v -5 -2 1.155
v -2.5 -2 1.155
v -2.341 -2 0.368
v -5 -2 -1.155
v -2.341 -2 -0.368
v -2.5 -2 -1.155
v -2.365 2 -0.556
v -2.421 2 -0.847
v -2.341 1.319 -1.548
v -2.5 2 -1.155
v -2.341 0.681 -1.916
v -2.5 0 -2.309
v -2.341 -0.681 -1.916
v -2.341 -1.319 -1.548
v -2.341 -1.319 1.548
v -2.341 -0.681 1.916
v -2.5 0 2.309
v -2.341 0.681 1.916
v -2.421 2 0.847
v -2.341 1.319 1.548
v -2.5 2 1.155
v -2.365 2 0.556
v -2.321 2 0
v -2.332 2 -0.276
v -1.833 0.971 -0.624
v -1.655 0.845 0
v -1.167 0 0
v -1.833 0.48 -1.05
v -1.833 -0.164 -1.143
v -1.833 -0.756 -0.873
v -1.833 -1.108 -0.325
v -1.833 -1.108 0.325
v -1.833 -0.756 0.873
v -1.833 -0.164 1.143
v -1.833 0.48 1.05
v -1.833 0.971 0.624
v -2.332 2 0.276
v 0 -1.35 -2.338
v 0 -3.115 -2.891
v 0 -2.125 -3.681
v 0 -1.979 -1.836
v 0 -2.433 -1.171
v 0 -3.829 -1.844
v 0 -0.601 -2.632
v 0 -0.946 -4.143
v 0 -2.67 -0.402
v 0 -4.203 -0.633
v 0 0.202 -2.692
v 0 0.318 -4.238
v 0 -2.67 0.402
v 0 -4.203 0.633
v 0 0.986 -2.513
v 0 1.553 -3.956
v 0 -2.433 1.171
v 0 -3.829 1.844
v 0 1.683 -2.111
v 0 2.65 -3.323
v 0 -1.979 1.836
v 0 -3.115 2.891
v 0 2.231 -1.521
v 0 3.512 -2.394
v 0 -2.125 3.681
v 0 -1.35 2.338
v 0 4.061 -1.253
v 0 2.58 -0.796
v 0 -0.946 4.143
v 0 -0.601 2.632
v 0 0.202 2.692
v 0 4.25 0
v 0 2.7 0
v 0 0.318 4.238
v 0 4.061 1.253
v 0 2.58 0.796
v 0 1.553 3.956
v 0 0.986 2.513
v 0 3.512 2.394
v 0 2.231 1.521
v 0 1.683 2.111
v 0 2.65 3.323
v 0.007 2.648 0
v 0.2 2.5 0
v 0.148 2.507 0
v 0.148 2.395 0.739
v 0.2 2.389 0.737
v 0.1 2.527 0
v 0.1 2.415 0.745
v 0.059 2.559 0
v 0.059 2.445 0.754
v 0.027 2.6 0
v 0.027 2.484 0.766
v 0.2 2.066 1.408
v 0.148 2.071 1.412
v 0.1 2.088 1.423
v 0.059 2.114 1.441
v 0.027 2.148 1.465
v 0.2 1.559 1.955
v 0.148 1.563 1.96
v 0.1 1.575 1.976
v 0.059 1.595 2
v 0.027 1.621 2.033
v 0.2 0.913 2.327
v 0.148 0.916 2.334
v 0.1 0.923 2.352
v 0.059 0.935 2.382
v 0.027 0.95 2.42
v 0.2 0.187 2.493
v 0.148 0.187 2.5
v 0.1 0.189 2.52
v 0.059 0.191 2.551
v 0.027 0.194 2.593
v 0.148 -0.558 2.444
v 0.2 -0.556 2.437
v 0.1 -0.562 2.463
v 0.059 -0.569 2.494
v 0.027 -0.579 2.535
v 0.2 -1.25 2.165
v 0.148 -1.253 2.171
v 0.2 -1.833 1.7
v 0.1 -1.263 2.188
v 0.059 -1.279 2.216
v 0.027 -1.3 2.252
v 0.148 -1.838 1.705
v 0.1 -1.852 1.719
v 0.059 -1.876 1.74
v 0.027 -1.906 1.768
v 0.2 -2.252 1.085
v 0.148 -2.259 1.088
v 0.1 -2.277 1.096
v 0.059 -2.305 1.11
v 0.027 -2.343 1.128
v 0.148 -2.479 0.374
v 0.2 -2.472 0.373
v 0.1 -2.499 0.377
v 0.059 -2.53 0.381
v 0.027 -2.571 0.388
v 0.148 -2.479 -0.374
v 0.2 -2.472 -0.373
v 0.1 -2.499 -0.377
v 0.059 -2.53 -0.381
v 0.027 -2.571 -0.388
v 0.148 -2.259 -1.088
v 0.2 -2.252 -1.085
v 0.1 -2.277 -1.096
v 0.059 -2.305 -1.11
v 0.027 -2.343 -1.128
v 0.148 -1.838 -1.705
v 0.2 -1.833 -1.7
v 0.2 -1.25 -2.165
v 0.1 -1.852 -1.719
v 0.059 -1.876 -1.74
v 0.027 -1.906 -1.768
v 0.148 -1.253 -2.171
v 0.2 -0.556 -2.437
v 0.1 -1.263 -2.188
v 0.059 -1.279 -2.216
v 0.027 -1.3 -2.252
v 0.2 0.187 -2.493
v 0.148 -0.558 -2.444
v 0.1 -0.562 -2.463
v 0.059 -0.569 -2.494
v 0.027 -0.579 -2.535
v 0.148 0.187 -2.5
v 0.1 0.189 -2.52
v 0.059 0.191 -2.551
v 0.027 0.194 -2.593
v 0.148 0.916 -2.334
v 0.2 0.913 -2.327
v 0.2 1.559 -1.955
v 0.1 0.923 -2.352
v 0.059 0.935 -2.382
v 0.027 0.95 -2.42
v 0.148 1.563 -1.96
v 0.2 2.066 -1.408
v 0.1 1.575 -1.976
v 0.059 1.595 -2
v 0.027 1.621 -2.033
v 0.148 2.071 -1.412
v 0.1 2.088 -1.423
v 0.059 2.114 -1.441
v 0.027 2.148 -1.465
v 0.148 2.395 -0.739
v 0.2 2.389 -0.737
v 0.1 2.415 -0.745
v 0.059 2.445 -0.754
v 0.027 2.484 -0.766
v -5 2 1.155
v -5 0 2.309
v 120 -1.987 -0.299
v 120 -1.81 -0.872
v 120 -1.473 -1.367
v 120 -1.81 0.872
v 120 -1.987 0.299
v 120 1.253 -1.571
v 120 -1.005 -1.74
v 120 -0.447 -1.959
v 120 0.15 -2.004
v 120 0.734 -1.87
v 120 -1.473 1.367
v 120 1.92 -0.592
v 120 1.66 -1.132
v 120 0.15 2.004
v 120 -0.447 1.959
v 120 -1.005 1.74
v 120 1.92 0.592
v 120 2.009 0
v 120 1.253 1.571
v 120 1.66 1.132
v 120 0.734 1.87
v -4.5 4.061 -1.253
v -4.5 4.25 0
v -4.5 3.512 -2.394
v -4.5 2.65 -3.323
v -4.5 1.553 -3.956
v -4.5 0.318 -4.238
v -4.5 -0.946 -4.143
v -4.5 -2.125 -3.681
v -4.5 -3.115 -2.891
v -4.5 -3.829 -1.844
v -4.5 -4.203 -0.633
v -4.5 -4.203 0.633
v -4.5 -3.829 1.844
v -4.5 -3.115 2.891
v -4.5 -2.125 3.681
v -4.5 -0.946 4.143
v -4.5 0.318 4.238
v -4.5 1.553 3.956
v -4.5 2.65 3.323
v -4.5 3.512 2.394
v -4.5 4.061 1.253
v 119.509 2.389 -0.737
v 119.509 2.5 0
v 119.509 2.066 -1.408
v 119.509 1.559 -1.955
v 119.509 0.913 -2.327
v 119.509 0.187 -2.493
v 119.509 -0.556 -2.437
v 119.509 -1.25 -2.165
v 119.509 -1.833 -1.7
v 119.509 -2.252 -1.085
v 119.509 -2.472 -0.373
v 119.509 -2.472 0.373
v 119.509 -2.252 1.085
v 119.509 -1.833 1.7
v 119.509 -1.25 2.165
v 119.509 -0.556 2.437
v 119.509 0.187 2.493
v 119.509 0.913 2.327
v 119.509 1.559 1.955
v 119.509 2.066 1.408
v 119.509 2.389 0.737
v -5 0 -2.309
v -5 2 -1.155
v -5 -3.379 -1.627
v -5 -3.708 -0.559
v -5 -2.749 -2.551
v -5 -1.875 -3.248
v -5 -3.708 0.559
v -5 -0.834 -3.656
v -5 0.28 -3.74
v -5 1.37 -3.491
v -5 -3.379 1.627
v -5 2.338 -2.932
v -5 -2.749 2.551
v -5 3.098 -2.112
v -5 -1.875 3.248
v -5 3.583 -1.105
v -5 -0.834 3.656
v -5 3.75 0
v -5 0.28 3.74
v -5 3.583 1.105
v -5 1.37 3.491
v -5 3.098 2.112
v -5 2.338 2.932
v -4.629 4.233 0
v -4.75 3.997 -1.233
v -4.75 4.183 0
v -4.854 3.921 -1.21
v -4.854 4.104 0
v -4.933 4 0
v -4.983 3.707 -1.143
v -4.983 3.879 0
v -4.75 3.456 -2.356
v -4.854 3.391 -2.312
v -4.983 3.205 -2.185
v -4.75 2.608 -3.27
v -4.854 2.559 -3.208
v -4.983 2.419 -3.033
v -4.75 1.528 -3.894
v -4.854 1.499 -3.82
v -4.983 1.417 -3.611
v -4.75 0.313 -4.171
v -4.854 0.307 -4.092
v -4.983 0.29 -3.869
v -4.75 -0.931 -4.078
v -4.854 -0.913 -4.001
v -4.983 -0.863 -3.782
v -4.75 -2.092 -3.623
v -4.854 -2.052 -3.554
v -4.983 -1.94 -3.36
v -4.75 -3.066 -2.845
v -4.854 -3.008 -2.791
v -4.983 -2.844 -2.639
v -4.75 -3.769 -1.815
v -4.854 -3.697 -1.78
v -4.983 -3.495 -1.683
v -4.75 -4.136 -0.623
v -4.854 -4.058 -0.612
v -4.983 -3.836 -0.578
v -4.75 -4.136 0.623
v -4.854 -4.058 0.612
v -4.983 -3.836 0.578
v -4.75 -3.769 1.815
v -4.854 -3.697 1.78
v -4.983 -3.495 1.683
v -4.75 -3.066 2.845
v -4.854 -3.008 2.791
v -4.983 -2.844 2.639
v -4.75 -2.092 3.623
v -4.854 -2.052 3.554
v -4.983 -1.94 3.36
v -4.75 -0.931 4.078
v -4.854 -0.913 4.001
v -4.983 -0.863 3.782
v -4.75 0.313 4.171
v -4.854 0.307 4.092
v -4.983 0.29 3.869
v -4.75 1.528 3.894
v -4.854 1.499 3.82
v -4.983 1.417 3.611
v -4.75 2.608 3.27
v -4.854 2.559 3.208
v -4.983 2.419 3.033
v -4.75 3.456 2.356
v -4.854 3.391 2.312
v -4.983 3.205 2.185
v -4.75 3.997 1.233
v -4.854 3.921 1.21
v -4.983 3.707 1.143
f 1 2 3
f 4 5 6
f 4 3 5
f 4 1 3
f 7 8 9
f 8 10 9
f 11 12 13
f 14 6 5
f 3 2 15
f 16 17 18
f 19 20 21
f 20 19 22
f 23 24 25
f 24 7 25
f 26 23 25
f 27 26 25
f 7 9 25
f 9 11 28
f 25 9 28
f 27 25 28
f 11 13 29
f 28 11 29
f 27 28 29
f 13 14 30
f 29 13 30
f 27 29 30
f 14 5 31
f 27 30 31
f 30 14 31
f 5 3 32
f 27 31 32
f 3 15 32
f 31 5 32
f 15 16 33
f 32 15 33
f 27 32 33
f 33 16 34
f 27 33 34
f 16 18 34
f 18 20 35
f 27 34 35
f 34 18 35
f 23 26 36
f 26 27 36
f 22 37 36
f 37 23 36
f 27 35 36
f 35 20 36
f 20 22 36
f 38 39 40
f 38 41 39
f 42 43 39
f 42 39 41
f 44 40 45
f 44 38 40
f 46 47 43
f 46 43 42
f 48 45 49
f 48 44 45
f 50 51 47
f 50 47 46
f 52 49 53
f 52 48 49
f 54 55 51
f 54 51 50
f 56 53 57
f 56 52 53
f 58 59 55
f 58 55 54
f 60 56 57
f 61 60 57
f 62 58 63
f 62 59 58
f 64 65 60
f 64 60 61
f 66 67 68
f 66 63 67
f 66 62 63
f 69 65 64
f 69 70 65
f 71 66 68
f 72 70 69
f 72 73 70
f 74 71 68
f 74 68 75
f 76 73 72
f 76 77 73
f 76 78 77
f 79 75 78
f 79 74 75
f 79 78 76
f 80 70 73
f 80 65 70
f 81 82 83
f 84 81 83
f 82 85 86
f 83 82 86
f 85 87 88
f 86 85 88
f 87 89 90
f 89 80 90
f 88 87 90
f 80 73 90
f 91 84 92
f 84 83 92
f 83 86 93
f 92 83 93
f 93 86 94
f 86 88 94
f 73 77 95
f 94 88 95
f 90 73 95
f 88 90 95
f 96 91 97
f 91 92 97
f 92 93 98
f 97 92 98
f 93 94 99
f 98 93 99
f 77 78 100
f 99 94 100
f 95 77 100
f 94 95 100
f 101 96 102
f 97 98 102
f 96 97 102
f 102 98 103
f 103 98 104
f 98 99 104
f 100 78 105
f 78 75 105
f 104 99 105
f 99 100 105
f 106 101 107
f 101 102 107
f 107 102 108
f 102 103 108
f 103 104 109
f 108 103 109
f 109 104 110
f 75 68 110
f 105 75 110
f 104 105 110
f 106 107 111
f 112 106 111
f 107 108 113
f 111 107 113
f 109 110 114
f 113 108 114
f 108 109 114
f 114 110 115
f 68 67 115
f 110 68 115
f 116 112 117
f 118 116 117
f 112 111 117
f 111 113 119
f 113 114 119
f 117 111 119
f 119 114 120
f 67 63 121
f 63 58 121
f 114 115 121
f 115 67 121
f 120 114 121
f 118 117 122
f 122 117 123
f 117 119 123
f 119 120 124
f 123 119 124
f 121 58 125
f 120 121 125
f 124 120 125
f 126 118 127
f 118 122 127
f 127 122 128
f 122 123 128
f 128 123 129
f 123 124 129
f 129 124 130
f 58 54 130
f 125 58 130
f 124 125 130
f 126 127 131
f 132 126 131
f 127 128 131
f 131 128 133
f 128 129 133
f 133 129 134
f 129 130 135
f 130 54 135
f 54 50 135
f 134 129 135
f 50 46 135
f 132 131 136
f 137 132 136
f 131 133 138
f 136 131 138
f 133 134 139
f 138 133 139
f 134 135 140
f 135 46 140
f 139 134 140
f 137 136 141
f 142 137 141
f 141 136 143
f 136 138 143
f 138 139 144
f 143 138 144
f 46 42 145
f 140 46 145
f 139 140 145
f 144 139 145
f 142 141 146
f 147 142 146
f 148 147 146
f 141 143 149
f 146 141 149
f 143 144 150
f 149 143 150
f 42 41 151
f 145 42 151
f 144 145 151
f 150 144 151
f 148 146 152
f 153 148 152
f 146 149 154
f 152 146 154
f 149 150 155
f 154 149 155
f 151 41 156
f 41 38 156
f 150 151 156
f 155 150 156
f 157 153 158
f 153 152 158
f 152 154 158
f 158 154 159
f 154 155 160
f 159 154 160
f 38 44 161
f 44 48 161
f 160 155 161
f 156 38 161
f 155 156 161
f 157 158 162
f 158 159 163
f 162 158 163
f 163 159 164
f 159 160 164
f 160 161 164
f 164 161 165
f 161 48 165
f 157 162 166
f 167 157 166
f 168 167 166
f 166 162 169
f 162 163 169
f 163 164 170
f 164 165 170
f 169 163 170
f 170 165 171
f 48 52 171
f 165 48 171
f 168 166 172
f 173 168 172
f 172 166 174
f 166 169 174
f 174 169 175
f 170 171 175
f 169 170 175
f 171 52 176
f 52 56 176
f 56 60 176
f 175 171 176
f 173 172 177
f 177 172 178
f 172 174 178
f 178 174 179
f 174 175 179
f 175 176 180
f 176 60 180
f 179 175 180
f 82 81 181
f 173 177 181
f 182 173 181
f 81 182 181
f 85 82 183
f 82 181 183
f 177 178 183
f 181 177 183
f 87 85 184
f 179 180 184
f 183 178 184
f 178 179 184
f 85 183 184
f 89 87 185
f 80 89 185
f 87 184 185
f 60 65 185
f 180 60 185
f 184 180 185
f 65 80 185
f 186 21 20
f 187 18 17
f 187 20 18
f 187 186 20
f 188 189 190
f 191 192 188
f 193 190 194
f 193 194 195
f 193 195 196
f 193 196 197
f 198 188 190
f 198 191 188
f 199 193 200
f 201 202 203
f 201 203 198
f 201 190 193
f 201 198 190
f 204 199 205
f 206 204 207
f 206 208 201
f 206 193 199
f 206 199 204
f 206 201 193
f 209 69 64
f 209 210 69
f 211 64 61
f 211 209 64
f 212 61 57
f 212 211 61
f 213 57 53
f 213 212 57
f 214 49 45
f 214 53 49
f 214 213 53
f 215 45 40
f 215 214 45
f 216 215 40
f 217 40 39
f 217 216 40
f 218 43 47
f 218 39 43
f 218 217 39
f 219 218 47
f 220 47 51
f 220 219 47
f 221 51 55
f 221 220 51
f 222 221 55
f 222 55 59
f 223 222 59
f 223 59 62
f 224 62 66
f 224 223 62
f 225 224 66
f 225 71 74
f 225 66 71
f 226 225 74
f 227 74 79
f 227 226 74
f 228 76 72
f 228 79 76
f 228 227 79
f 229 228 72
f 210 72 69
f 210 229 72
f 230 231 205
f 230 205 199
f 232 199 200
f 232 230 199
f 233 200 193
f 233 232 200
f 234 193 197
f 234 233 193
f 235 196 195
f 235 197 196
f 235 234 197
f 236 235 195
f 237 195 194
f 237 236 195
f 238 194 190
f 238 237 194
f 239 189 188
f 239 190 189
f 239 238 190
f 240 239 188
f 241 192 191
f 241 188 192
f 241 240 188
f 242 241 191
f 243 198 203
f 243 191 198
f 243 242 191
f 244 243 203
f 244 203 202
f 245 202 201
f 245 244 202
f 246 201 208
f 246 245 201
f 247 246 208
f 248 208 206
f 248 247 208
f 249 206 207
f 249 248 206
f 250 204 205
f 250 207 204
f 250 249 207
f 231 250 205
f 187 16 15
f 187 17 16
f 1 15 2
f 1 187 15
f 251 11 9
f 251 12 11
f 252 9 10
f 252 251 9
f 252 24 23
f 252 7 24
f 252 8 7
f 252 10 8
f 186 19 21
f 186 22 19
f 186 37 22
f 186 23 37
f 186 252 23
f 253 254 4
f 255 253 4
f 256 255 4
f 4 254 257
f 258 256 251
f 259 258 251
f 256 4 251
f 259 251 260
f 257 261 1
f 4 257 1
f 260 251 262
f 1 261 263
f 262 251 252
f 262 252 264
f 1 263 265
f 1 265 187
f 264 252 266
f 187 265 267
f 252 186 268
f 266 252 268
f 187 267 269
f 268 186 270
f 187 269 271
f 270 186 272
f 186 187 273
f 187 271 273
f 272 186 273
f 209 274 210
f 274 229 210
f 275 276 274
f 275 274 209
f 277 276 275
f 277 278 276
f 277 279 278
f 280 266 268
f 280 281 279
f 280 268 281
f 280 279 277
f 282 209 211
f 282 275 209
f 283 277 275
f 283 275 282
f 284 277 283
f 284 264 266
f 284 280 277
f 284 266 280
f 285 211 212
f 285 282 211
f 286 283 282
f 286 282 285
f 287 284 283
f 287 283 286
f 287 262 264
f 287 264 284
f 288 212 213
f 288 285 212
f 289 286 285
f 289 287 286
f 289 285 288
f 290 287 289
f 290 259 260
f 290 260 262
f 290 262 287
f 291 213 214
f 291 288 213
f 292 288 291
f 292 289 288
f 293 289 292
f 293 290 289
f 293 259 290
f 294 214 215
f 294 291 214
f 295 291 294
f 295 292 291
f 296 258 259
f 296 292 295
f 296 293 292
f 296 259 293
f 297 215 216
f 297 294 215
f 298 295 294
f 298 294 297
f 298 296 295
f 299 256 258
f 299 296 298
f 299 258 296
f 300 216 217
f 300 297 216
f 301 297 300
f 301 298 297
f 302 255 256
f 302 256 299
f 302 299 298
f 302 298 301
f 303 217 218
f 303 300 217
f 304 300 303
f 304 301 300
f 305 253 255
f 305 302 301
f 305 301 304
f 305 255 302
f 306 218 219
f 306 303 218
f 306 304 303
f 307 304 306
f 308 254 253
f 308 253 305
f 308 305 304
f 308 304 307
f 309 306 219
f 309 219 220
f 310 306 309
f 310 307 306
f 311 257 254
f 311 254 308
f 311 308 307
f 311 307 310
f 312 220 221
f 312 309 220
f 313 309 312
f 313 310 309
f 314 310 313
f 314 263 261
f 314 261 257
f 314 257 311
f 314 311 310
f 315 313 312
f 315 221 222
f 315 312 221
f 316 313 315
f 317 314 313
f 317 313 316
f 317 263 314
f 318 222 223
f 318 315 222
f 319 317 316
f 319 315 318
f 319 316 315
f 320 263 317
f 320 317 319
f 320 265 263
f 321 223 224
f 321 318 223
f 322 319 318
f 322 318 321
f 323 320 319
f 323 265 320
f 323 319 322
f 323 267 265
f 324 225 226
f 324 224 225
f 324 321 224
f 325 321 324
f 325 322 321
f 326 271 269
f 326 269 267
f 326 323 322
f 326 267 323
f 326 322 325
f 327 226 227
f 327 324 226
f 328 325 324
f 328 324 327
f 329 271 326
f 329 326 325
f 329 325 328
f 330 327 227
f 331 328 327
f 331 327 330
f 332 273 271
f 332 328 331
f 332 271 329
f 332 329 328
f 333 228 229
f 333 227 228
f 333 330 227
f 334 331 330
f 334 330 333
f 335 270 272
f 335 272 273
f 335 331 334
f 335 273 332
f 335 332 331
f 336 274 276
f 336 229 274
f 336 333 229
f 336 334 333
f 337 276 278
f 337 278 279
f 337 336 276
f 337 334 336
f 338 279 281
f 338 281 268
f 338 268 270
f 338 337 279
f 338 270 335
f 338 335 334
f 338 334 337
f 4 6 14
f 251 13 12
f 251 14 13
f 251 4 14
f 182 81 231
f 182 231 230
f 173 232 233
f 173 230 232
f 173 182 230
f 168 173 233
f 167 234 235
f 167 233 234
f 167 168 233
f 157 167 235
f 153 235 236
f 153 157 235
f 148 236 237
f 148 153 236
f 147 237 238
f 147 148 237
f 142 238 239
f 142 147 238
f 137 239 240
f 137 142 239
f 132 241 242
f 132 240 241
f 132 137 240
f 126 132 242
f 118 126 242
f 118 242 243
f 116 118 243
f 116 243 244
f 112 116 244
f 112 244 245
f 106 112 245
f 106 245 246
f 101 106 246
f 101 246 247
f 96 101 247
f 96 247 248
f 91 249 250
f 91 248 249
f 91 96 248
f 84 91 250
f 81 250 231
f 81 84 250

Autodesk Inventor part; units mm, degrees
ref_plane "YZ Plane" through (0, 0, 0) normal (1, 0, 0) x (0, 1, 0)
ref_plane "XZ Plane" through (0, 0, 0) normal (0, 1, 0) x (-1, 0, 0)
sketch "Sketch1" plane through (0, 0, 0) normal (0, 0, 1) x (1, 0, 0)
  line L0 (-1.1667, 0) -> (120, 0)
  line L1 (120, 0) -> (120, 2.5)
  line L2 (120, 2.5) -> (98, 2.5)
  line L3 (98, 2.5) -> (97.5091, 2.5)
  line L4 (97.5091, 2.5) -> (0, 2.5)
  line L5 (0, 2.5) -> (0, 4.25)
  line L6 (0, 4.25) -> (-5, 4.25)
  line L7 (-5, 4.25) -> (-5, 2.3094)
  line L8 (-5, 2.3094) -> (-2.5, 2.3094)
  line L9 (-2.5, 2.3094) -> (-1.1667, 0)
  line L10 (-22, 0) -> (97, 0) projected
  line L11 (0, -0.85) -> (0, 5.1) projected
  line L12 (98, 2.5) -> (0, 2.5) construction
  dimension "d1" = 22
  dimension "d2" = 0.4909
  dimension "d3" = 5
  dimension "d4" = 2.5
  dimension "d5" = 60
  dimension "d6" = 5
  dimension "d7" = 5
  dimension "d8" = 4.6188
  dimension "d9" = 8.5
  dimension "d26" = 120
revolve "Body" add sketch "Sketch1" angle 360 about axis through (-1.1667, 0, 0) along (1, 0, 0)
sketch "Sketch2" plane through (-5, 0, 0) normal (-1, 0, 0) x (0, 0, 1)
  circle A0 centre (0, 0) radius 2.3094 projected
  line L0 (0, -5.95) -> (0, 5.95) projected
  line L1 (-5.95, 0) -> (5.95, 0) projected
  line L2 (2.3094, 0) -> (1.1547, -2)
  line L3 (1.1547, -2) -> (-1.1547, -2)
  line L4 (-1.1547, -2) -> (-2.3094, 0)
  line L5 (-2.3094, 0) -> (-1.1547, 2)
  line L6 (-1.1547, 2) -> (1.1547, 2)
  line L7 (1.1547, 2) -> (2.3094, 0)
extrude "Slot" add sketch "Sketch2" against normal up to next contours L7 A0 | A0 L2 | L6 L0 A0 | A0 L0 L3 | L0 L6 A0 | A0 L3 L0 | L4 A0 | A0 L5
fillet "Fillet1" radius 0.5 1 edges at (-5, -4.25, 0)
thread "Thread" size "M5x0.8" class "6g" standard "ISO Metric profile" length 22
chamfer "Chamfer1" distance 0.4908 distance2 0.4908 1 edges at (120, -2.5, 0) measured on face at (120, -0.6238, 0.5526)
ref_plane "Work Plane1" through (29, 0, 0) normal (0, -1, 0) x (1, 0, 0)
fillet "Fillet2" radius 0.2 1 edges at (0, -2.5, 0)
equation "\"d30\" = R"
equation "\"d17\" = RR"
equation "\"d13\" = GEL"
equation "\"d15\" = -0.5 * SPD + 0.5 * GD"
equation "\"d16\" = GUL"
equation "\"d1\" = GEL"
equation "\"d3\" = KOH"
equation "\"d4\" = INTI"
equation "\"d6\" = GD"
equation "\"d7\" = BDM"
equation "\"d8\" = 1.1547 * SW"
equation "\"d9\" = KOD"
equation "\"d26\" = NLG"
equation "\"GD\" = NND"
equation "\"NLG\" = 120"
equation "\"GEL\" = 22"
equation "\"KOD\" = 8.5"
equation "\"KOH\" = 5"
equation "\"INTI\" = 2.5"
equation "\"GAL\" = 0.61345 * PTC"
equation "\"GUL\" = 0.61345 * PTC"
equation "\"BDM\" = NND"
equation "\"SW\" = 4"
equation "\"RR\" = 0.5"
equation "\"SPD\" = NND - 1.2269 * PTC"
equation "\"R\" = 0.2"
equation "\"TOA\" = 30deg"
equation "\"GD1\" = THREADDIA - 1.2269 * PTC"
equation "\"THREADDIA\" = 5"
equation "\"FAWI\" = 45deg"
equation "\"ANG\" = 120deg"
equation "\"PTC\" = 0.8"
equation "\"NND\" = 5"
equation "\"E0\" = 1.155 * SW"
properties material "Steel, Mild"
